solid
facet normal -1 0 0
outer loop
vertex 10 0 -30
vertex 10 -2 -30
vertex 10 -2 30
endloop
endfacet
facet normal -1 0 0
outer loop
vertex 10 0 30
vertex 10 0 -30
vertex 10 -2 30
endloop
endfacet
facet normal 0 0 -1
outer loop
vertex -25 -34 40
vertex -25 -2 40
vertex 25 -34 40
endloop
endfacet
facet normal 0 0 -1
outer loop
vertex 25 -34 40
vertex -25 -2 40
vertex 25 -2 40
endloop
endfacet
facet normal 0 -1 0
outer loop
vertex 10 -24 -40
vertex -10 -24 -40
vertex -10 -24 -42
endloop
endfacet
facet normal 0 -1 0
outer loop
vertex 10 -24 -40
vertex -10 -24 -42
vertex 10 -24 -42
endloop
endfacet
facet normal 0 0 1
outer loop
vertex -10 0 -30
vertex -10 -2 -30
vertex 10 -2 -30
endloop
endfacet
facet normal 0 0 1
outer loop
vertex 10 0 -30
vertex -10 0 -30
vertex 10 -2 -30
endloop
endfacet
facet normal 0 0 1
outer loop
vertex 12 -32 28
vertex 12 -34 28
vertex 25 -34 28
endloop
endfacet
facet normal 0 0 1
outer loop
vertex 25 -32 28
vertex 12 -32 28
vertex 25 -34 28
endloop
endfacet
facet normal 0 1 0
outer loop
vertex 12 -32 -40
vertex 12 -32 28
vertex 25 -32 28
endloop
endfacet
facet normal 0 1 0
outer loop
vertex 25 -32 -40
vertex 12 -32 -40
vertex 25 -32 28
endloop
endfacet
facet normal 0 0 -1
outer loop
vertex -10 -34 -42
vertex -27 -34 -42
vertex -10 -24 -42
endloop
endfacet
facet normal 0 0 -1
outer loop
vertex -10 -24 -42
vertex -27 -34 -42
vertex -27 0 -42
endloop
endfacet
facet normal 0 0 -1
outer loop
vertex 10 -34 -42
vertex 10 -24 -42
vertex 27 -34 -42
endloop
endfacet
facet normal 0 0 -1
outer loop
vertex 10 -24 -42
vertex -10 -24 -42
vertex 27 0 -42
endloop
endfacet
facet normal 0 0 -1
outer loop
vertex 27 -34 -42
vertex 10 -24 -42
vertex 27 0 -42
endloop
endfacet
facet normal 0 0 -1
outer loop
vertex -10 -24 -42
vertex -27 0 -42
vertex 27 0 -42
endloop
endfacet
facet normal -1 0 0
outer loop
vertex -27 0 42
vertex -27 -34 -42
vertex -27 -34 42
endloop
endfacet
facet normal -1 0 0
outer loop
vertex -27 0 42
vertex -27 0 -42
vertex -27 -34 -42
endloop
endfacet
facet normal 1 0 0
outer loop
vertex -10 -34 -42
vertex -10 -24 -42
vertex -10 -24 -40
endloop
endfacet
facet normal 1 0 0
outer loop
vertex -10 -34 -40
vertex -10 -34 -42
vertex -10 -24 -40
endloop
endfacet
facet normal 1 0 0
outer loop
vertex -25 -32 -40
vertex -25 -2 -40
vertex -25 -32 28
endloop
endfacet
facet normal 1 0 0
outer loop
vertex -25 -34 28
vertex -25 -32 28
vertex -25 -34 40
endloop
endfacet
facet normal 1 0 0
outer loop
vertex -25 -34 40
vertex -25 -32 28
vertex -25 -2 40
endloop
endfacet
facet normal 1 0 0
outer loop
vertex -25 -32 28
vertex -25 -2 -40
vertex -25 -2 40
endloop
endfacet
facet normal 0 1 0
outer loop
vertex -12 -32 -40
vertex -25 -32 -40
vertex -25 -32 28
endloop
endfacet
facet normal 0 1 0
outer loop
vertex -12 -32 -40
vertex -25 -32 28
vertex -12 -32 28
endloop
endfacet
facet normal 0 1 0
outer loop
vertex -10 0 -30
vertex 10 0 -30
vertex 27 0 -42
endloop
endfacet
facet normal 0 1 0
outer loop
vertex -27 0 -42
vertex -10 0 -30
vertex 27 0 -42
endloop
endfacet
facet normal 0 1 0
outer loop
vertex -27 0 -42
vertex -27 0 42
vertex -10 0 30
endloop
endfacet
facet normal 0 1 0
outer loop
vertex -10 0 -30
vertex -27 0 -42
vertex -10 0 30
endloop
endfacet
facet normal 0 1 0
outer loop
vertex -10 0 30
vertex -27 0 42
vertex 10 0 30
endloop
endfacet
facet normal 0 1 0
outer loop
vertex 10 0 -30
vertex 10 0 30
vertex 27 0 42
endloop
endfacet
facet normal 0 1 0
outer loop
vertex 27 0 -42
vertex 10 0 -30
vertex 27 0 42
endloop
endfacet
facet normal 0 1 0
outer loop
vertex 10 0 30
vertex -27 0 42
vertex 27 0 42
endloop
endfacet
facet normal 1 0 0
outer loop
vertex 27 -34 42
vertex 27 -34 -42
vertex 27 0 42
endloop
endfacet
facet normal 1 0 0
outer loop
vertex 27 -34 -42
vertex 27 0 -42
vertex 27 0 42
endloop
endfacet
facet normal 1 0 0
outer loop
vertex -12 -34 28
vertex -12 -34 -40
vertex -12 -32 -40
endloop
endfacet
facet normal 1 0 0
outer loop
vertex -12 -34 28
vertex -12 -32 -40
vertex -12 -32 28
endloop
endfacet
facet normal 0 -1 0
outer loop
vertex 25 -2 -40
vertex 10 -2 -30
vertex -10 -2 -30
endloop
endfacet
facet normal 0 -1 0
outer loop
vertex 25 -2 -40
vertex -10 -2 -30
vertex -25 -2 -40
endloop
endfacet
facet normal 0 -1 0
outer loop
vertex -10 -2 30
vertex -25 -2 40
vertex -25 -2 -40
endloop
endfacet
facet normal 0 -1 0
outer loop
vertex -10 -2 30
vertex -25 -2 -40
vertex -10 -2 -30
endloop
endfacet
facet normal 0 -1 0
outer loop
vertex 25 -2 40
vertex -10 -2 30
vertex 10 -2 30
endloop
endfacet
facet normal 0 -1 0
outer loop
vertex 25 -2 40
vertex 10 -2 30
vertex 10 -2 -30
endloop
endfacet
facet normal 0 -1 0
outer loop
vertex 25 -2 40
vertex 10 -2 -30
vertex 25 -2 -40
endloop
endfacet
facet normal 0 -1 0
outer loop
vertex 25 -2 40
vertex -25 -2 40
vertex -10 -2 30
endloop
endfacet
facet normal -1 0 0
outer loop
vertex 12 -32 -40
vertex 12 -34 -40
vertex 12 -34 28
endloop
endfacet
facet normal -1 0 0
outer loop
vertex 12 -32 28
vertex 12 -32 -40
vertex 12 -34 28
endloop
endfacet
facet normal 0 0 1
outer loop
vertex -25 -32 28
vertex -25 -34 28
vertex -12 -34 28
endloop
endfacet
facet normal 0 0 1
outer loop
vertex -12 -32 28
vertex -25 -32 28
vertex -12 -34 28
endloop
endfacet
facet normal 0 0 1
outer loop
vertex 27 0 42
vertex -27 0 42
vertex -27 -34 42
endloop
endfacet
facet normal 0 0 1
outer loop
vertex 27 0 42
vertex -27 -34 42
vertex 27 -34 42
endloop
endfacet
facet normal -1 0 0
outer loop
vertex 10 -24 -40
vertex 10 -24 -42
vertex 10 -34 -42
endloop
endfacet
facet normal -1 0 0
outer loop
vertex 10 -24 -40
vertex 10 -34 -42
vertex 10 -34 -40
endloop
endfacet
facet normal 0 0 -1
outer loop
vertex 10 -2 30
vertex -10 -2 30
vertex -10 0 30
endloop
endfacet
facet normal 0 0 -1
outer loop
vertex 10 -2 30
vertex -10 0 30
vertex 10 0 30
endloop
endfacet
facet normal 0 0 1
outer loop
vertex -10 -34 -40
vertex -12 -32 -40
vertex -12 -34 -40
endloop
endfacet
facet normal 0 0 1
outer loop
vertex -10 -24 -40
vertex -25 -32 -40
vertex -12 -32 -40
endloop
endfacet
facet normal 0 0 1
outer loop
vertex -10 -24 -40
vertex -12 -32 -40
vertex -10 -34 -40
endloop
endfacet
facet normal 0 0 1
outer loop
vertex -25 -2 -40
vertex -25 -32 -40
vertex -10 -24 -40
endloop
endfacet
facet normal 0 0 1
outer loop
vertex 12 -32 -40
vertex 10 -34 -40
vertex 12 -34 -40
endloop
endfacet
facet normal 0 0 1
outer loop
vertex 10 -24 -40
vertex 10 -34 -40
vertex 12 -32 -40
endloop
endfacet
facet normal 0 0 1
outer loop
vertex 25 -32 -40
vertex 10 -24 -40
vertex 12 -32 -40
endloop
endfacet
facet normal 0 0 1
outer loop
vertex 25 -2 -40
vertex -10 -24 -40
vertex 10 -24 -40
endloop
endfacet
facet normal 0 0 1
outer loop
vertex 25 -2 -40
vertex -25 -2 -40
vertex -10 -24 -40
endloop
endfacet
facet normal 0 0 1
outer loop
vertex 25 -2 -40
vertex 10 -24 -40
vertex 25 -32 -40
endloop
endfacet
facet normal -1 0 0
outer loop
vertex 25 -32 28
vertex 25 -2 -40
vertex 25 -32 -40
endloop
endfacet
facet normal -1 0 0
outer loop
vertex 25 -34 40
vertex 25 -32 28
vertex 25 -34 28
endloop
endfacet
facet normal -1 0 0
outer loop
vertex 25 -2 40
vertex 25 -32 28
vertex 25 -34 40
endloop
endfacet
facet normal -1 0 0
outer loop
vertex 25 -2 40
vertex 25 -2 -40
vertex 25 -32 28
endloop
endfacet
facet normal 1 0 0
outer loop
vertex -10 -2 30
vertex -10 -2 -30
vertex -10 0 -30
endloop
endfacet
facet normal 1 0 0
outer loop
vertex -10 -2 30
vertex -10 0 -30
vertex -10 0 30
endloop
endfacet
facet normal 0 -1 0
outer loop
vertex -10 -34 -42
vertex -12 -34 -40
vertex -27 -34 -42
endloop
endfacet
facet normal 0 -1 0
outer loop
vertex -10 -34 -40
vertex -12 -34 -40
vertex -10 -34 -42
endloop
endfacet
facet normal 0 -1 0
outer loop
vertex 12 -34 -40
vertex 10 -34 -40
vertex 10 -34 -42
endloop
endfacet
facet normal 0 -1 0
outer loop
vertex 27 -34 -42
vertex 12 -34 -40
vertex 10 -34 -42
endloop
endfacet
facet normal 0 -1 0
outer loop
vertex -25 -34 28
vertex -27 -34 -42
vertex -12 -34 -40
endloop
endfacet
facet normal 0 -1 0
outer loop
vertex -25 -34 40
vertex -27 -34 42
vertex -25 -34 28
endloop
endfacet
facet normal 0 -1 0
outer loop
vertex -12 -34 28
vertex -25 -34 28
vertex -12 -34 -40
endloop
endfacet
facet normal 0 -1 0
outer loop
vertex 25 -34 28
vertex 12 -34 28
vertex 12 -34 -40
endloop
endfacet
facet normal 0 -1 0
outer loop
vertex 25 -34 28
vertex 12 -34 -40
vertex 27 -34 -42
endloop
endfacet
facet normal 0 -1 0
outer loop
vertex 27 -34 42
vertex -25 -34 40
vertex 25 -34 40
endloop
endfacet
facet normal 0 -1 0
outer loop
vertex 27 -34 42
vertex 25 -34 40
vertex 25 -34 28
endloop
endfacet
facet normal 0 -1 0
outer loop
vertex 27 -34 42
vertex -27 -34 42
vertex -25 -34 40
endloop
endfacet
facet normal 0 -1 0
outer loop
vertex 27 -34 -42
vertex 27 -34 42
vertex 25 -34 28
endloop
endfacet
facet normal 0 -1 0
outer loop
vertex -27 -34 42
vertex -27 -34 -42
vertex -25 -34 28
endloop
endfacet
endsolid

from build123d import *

# Parameters (mm, degrees)
F0_W      = 54
F0_H      = 84
F1_DEPTH  = 34
F2_T      = -2
F3_W      = 20
F3_H      = 60
F4_DEPTH  = 25
F5_W      = 15
F5_H      = 70
F6_DEPTH  = 2
F7_W      = 15
F7_H      = 70
F8_DEPTH  = 2
F9_W      = 10
F9_H      = 2
F10_DEPTH = 10


with BuildPart() as f1:
    # F0 (on Front) → F1 (new body)
    with BuildSketch(Plane.XZ):
        Rectangle(F0_W, F0_H)
    extrude(amount=F1_DEPTH)

    # F2
    f2_openings = [f1.faces().sort_by_distance(p)[0] for p in [
        (0, -34, 0),
    ]]
    offset(amount=F2_T, openings=f2_openings)

    # F3 (on face) → F4 (cut)
    with BuildSketch(Plane.XZ.offset(2)):
        Rectangle(F3_W, F3_H)
    extrude(amount=-F4_DEPTH, mode=Mode.SUBTRACT)

    # F5 (on face) → F6 (join)
    with BuildSketch(Plane.XZ.offset(34)):
        with Locations((-19.5, -7)):
            Rectangle(F5_W, F5_H)
    extrude(amount=-F6_DEPTH)

    # F7 (on face) → F8 (join)
    with BuildSketch(Plane.XZ.offset(34)):
        with Locations((19.5, -7)):
            Rectangle(F7_W, F7_H)
    extrude(amount=-F8_DEPTH)

    # F9 (on face) → F10 (cut)
    with BuildSketch(Plane.XZ.offset(34)):
        with Locations((-5, -41)):
            Rectangle(F9_W, F9_H)
        with Locations((5, -41)):
            Rectangle(F9_W, F9_H)
    extrude(amount=-F10_DEPTH, mode=Mode.SUBTRACT)


solid = f1.part
